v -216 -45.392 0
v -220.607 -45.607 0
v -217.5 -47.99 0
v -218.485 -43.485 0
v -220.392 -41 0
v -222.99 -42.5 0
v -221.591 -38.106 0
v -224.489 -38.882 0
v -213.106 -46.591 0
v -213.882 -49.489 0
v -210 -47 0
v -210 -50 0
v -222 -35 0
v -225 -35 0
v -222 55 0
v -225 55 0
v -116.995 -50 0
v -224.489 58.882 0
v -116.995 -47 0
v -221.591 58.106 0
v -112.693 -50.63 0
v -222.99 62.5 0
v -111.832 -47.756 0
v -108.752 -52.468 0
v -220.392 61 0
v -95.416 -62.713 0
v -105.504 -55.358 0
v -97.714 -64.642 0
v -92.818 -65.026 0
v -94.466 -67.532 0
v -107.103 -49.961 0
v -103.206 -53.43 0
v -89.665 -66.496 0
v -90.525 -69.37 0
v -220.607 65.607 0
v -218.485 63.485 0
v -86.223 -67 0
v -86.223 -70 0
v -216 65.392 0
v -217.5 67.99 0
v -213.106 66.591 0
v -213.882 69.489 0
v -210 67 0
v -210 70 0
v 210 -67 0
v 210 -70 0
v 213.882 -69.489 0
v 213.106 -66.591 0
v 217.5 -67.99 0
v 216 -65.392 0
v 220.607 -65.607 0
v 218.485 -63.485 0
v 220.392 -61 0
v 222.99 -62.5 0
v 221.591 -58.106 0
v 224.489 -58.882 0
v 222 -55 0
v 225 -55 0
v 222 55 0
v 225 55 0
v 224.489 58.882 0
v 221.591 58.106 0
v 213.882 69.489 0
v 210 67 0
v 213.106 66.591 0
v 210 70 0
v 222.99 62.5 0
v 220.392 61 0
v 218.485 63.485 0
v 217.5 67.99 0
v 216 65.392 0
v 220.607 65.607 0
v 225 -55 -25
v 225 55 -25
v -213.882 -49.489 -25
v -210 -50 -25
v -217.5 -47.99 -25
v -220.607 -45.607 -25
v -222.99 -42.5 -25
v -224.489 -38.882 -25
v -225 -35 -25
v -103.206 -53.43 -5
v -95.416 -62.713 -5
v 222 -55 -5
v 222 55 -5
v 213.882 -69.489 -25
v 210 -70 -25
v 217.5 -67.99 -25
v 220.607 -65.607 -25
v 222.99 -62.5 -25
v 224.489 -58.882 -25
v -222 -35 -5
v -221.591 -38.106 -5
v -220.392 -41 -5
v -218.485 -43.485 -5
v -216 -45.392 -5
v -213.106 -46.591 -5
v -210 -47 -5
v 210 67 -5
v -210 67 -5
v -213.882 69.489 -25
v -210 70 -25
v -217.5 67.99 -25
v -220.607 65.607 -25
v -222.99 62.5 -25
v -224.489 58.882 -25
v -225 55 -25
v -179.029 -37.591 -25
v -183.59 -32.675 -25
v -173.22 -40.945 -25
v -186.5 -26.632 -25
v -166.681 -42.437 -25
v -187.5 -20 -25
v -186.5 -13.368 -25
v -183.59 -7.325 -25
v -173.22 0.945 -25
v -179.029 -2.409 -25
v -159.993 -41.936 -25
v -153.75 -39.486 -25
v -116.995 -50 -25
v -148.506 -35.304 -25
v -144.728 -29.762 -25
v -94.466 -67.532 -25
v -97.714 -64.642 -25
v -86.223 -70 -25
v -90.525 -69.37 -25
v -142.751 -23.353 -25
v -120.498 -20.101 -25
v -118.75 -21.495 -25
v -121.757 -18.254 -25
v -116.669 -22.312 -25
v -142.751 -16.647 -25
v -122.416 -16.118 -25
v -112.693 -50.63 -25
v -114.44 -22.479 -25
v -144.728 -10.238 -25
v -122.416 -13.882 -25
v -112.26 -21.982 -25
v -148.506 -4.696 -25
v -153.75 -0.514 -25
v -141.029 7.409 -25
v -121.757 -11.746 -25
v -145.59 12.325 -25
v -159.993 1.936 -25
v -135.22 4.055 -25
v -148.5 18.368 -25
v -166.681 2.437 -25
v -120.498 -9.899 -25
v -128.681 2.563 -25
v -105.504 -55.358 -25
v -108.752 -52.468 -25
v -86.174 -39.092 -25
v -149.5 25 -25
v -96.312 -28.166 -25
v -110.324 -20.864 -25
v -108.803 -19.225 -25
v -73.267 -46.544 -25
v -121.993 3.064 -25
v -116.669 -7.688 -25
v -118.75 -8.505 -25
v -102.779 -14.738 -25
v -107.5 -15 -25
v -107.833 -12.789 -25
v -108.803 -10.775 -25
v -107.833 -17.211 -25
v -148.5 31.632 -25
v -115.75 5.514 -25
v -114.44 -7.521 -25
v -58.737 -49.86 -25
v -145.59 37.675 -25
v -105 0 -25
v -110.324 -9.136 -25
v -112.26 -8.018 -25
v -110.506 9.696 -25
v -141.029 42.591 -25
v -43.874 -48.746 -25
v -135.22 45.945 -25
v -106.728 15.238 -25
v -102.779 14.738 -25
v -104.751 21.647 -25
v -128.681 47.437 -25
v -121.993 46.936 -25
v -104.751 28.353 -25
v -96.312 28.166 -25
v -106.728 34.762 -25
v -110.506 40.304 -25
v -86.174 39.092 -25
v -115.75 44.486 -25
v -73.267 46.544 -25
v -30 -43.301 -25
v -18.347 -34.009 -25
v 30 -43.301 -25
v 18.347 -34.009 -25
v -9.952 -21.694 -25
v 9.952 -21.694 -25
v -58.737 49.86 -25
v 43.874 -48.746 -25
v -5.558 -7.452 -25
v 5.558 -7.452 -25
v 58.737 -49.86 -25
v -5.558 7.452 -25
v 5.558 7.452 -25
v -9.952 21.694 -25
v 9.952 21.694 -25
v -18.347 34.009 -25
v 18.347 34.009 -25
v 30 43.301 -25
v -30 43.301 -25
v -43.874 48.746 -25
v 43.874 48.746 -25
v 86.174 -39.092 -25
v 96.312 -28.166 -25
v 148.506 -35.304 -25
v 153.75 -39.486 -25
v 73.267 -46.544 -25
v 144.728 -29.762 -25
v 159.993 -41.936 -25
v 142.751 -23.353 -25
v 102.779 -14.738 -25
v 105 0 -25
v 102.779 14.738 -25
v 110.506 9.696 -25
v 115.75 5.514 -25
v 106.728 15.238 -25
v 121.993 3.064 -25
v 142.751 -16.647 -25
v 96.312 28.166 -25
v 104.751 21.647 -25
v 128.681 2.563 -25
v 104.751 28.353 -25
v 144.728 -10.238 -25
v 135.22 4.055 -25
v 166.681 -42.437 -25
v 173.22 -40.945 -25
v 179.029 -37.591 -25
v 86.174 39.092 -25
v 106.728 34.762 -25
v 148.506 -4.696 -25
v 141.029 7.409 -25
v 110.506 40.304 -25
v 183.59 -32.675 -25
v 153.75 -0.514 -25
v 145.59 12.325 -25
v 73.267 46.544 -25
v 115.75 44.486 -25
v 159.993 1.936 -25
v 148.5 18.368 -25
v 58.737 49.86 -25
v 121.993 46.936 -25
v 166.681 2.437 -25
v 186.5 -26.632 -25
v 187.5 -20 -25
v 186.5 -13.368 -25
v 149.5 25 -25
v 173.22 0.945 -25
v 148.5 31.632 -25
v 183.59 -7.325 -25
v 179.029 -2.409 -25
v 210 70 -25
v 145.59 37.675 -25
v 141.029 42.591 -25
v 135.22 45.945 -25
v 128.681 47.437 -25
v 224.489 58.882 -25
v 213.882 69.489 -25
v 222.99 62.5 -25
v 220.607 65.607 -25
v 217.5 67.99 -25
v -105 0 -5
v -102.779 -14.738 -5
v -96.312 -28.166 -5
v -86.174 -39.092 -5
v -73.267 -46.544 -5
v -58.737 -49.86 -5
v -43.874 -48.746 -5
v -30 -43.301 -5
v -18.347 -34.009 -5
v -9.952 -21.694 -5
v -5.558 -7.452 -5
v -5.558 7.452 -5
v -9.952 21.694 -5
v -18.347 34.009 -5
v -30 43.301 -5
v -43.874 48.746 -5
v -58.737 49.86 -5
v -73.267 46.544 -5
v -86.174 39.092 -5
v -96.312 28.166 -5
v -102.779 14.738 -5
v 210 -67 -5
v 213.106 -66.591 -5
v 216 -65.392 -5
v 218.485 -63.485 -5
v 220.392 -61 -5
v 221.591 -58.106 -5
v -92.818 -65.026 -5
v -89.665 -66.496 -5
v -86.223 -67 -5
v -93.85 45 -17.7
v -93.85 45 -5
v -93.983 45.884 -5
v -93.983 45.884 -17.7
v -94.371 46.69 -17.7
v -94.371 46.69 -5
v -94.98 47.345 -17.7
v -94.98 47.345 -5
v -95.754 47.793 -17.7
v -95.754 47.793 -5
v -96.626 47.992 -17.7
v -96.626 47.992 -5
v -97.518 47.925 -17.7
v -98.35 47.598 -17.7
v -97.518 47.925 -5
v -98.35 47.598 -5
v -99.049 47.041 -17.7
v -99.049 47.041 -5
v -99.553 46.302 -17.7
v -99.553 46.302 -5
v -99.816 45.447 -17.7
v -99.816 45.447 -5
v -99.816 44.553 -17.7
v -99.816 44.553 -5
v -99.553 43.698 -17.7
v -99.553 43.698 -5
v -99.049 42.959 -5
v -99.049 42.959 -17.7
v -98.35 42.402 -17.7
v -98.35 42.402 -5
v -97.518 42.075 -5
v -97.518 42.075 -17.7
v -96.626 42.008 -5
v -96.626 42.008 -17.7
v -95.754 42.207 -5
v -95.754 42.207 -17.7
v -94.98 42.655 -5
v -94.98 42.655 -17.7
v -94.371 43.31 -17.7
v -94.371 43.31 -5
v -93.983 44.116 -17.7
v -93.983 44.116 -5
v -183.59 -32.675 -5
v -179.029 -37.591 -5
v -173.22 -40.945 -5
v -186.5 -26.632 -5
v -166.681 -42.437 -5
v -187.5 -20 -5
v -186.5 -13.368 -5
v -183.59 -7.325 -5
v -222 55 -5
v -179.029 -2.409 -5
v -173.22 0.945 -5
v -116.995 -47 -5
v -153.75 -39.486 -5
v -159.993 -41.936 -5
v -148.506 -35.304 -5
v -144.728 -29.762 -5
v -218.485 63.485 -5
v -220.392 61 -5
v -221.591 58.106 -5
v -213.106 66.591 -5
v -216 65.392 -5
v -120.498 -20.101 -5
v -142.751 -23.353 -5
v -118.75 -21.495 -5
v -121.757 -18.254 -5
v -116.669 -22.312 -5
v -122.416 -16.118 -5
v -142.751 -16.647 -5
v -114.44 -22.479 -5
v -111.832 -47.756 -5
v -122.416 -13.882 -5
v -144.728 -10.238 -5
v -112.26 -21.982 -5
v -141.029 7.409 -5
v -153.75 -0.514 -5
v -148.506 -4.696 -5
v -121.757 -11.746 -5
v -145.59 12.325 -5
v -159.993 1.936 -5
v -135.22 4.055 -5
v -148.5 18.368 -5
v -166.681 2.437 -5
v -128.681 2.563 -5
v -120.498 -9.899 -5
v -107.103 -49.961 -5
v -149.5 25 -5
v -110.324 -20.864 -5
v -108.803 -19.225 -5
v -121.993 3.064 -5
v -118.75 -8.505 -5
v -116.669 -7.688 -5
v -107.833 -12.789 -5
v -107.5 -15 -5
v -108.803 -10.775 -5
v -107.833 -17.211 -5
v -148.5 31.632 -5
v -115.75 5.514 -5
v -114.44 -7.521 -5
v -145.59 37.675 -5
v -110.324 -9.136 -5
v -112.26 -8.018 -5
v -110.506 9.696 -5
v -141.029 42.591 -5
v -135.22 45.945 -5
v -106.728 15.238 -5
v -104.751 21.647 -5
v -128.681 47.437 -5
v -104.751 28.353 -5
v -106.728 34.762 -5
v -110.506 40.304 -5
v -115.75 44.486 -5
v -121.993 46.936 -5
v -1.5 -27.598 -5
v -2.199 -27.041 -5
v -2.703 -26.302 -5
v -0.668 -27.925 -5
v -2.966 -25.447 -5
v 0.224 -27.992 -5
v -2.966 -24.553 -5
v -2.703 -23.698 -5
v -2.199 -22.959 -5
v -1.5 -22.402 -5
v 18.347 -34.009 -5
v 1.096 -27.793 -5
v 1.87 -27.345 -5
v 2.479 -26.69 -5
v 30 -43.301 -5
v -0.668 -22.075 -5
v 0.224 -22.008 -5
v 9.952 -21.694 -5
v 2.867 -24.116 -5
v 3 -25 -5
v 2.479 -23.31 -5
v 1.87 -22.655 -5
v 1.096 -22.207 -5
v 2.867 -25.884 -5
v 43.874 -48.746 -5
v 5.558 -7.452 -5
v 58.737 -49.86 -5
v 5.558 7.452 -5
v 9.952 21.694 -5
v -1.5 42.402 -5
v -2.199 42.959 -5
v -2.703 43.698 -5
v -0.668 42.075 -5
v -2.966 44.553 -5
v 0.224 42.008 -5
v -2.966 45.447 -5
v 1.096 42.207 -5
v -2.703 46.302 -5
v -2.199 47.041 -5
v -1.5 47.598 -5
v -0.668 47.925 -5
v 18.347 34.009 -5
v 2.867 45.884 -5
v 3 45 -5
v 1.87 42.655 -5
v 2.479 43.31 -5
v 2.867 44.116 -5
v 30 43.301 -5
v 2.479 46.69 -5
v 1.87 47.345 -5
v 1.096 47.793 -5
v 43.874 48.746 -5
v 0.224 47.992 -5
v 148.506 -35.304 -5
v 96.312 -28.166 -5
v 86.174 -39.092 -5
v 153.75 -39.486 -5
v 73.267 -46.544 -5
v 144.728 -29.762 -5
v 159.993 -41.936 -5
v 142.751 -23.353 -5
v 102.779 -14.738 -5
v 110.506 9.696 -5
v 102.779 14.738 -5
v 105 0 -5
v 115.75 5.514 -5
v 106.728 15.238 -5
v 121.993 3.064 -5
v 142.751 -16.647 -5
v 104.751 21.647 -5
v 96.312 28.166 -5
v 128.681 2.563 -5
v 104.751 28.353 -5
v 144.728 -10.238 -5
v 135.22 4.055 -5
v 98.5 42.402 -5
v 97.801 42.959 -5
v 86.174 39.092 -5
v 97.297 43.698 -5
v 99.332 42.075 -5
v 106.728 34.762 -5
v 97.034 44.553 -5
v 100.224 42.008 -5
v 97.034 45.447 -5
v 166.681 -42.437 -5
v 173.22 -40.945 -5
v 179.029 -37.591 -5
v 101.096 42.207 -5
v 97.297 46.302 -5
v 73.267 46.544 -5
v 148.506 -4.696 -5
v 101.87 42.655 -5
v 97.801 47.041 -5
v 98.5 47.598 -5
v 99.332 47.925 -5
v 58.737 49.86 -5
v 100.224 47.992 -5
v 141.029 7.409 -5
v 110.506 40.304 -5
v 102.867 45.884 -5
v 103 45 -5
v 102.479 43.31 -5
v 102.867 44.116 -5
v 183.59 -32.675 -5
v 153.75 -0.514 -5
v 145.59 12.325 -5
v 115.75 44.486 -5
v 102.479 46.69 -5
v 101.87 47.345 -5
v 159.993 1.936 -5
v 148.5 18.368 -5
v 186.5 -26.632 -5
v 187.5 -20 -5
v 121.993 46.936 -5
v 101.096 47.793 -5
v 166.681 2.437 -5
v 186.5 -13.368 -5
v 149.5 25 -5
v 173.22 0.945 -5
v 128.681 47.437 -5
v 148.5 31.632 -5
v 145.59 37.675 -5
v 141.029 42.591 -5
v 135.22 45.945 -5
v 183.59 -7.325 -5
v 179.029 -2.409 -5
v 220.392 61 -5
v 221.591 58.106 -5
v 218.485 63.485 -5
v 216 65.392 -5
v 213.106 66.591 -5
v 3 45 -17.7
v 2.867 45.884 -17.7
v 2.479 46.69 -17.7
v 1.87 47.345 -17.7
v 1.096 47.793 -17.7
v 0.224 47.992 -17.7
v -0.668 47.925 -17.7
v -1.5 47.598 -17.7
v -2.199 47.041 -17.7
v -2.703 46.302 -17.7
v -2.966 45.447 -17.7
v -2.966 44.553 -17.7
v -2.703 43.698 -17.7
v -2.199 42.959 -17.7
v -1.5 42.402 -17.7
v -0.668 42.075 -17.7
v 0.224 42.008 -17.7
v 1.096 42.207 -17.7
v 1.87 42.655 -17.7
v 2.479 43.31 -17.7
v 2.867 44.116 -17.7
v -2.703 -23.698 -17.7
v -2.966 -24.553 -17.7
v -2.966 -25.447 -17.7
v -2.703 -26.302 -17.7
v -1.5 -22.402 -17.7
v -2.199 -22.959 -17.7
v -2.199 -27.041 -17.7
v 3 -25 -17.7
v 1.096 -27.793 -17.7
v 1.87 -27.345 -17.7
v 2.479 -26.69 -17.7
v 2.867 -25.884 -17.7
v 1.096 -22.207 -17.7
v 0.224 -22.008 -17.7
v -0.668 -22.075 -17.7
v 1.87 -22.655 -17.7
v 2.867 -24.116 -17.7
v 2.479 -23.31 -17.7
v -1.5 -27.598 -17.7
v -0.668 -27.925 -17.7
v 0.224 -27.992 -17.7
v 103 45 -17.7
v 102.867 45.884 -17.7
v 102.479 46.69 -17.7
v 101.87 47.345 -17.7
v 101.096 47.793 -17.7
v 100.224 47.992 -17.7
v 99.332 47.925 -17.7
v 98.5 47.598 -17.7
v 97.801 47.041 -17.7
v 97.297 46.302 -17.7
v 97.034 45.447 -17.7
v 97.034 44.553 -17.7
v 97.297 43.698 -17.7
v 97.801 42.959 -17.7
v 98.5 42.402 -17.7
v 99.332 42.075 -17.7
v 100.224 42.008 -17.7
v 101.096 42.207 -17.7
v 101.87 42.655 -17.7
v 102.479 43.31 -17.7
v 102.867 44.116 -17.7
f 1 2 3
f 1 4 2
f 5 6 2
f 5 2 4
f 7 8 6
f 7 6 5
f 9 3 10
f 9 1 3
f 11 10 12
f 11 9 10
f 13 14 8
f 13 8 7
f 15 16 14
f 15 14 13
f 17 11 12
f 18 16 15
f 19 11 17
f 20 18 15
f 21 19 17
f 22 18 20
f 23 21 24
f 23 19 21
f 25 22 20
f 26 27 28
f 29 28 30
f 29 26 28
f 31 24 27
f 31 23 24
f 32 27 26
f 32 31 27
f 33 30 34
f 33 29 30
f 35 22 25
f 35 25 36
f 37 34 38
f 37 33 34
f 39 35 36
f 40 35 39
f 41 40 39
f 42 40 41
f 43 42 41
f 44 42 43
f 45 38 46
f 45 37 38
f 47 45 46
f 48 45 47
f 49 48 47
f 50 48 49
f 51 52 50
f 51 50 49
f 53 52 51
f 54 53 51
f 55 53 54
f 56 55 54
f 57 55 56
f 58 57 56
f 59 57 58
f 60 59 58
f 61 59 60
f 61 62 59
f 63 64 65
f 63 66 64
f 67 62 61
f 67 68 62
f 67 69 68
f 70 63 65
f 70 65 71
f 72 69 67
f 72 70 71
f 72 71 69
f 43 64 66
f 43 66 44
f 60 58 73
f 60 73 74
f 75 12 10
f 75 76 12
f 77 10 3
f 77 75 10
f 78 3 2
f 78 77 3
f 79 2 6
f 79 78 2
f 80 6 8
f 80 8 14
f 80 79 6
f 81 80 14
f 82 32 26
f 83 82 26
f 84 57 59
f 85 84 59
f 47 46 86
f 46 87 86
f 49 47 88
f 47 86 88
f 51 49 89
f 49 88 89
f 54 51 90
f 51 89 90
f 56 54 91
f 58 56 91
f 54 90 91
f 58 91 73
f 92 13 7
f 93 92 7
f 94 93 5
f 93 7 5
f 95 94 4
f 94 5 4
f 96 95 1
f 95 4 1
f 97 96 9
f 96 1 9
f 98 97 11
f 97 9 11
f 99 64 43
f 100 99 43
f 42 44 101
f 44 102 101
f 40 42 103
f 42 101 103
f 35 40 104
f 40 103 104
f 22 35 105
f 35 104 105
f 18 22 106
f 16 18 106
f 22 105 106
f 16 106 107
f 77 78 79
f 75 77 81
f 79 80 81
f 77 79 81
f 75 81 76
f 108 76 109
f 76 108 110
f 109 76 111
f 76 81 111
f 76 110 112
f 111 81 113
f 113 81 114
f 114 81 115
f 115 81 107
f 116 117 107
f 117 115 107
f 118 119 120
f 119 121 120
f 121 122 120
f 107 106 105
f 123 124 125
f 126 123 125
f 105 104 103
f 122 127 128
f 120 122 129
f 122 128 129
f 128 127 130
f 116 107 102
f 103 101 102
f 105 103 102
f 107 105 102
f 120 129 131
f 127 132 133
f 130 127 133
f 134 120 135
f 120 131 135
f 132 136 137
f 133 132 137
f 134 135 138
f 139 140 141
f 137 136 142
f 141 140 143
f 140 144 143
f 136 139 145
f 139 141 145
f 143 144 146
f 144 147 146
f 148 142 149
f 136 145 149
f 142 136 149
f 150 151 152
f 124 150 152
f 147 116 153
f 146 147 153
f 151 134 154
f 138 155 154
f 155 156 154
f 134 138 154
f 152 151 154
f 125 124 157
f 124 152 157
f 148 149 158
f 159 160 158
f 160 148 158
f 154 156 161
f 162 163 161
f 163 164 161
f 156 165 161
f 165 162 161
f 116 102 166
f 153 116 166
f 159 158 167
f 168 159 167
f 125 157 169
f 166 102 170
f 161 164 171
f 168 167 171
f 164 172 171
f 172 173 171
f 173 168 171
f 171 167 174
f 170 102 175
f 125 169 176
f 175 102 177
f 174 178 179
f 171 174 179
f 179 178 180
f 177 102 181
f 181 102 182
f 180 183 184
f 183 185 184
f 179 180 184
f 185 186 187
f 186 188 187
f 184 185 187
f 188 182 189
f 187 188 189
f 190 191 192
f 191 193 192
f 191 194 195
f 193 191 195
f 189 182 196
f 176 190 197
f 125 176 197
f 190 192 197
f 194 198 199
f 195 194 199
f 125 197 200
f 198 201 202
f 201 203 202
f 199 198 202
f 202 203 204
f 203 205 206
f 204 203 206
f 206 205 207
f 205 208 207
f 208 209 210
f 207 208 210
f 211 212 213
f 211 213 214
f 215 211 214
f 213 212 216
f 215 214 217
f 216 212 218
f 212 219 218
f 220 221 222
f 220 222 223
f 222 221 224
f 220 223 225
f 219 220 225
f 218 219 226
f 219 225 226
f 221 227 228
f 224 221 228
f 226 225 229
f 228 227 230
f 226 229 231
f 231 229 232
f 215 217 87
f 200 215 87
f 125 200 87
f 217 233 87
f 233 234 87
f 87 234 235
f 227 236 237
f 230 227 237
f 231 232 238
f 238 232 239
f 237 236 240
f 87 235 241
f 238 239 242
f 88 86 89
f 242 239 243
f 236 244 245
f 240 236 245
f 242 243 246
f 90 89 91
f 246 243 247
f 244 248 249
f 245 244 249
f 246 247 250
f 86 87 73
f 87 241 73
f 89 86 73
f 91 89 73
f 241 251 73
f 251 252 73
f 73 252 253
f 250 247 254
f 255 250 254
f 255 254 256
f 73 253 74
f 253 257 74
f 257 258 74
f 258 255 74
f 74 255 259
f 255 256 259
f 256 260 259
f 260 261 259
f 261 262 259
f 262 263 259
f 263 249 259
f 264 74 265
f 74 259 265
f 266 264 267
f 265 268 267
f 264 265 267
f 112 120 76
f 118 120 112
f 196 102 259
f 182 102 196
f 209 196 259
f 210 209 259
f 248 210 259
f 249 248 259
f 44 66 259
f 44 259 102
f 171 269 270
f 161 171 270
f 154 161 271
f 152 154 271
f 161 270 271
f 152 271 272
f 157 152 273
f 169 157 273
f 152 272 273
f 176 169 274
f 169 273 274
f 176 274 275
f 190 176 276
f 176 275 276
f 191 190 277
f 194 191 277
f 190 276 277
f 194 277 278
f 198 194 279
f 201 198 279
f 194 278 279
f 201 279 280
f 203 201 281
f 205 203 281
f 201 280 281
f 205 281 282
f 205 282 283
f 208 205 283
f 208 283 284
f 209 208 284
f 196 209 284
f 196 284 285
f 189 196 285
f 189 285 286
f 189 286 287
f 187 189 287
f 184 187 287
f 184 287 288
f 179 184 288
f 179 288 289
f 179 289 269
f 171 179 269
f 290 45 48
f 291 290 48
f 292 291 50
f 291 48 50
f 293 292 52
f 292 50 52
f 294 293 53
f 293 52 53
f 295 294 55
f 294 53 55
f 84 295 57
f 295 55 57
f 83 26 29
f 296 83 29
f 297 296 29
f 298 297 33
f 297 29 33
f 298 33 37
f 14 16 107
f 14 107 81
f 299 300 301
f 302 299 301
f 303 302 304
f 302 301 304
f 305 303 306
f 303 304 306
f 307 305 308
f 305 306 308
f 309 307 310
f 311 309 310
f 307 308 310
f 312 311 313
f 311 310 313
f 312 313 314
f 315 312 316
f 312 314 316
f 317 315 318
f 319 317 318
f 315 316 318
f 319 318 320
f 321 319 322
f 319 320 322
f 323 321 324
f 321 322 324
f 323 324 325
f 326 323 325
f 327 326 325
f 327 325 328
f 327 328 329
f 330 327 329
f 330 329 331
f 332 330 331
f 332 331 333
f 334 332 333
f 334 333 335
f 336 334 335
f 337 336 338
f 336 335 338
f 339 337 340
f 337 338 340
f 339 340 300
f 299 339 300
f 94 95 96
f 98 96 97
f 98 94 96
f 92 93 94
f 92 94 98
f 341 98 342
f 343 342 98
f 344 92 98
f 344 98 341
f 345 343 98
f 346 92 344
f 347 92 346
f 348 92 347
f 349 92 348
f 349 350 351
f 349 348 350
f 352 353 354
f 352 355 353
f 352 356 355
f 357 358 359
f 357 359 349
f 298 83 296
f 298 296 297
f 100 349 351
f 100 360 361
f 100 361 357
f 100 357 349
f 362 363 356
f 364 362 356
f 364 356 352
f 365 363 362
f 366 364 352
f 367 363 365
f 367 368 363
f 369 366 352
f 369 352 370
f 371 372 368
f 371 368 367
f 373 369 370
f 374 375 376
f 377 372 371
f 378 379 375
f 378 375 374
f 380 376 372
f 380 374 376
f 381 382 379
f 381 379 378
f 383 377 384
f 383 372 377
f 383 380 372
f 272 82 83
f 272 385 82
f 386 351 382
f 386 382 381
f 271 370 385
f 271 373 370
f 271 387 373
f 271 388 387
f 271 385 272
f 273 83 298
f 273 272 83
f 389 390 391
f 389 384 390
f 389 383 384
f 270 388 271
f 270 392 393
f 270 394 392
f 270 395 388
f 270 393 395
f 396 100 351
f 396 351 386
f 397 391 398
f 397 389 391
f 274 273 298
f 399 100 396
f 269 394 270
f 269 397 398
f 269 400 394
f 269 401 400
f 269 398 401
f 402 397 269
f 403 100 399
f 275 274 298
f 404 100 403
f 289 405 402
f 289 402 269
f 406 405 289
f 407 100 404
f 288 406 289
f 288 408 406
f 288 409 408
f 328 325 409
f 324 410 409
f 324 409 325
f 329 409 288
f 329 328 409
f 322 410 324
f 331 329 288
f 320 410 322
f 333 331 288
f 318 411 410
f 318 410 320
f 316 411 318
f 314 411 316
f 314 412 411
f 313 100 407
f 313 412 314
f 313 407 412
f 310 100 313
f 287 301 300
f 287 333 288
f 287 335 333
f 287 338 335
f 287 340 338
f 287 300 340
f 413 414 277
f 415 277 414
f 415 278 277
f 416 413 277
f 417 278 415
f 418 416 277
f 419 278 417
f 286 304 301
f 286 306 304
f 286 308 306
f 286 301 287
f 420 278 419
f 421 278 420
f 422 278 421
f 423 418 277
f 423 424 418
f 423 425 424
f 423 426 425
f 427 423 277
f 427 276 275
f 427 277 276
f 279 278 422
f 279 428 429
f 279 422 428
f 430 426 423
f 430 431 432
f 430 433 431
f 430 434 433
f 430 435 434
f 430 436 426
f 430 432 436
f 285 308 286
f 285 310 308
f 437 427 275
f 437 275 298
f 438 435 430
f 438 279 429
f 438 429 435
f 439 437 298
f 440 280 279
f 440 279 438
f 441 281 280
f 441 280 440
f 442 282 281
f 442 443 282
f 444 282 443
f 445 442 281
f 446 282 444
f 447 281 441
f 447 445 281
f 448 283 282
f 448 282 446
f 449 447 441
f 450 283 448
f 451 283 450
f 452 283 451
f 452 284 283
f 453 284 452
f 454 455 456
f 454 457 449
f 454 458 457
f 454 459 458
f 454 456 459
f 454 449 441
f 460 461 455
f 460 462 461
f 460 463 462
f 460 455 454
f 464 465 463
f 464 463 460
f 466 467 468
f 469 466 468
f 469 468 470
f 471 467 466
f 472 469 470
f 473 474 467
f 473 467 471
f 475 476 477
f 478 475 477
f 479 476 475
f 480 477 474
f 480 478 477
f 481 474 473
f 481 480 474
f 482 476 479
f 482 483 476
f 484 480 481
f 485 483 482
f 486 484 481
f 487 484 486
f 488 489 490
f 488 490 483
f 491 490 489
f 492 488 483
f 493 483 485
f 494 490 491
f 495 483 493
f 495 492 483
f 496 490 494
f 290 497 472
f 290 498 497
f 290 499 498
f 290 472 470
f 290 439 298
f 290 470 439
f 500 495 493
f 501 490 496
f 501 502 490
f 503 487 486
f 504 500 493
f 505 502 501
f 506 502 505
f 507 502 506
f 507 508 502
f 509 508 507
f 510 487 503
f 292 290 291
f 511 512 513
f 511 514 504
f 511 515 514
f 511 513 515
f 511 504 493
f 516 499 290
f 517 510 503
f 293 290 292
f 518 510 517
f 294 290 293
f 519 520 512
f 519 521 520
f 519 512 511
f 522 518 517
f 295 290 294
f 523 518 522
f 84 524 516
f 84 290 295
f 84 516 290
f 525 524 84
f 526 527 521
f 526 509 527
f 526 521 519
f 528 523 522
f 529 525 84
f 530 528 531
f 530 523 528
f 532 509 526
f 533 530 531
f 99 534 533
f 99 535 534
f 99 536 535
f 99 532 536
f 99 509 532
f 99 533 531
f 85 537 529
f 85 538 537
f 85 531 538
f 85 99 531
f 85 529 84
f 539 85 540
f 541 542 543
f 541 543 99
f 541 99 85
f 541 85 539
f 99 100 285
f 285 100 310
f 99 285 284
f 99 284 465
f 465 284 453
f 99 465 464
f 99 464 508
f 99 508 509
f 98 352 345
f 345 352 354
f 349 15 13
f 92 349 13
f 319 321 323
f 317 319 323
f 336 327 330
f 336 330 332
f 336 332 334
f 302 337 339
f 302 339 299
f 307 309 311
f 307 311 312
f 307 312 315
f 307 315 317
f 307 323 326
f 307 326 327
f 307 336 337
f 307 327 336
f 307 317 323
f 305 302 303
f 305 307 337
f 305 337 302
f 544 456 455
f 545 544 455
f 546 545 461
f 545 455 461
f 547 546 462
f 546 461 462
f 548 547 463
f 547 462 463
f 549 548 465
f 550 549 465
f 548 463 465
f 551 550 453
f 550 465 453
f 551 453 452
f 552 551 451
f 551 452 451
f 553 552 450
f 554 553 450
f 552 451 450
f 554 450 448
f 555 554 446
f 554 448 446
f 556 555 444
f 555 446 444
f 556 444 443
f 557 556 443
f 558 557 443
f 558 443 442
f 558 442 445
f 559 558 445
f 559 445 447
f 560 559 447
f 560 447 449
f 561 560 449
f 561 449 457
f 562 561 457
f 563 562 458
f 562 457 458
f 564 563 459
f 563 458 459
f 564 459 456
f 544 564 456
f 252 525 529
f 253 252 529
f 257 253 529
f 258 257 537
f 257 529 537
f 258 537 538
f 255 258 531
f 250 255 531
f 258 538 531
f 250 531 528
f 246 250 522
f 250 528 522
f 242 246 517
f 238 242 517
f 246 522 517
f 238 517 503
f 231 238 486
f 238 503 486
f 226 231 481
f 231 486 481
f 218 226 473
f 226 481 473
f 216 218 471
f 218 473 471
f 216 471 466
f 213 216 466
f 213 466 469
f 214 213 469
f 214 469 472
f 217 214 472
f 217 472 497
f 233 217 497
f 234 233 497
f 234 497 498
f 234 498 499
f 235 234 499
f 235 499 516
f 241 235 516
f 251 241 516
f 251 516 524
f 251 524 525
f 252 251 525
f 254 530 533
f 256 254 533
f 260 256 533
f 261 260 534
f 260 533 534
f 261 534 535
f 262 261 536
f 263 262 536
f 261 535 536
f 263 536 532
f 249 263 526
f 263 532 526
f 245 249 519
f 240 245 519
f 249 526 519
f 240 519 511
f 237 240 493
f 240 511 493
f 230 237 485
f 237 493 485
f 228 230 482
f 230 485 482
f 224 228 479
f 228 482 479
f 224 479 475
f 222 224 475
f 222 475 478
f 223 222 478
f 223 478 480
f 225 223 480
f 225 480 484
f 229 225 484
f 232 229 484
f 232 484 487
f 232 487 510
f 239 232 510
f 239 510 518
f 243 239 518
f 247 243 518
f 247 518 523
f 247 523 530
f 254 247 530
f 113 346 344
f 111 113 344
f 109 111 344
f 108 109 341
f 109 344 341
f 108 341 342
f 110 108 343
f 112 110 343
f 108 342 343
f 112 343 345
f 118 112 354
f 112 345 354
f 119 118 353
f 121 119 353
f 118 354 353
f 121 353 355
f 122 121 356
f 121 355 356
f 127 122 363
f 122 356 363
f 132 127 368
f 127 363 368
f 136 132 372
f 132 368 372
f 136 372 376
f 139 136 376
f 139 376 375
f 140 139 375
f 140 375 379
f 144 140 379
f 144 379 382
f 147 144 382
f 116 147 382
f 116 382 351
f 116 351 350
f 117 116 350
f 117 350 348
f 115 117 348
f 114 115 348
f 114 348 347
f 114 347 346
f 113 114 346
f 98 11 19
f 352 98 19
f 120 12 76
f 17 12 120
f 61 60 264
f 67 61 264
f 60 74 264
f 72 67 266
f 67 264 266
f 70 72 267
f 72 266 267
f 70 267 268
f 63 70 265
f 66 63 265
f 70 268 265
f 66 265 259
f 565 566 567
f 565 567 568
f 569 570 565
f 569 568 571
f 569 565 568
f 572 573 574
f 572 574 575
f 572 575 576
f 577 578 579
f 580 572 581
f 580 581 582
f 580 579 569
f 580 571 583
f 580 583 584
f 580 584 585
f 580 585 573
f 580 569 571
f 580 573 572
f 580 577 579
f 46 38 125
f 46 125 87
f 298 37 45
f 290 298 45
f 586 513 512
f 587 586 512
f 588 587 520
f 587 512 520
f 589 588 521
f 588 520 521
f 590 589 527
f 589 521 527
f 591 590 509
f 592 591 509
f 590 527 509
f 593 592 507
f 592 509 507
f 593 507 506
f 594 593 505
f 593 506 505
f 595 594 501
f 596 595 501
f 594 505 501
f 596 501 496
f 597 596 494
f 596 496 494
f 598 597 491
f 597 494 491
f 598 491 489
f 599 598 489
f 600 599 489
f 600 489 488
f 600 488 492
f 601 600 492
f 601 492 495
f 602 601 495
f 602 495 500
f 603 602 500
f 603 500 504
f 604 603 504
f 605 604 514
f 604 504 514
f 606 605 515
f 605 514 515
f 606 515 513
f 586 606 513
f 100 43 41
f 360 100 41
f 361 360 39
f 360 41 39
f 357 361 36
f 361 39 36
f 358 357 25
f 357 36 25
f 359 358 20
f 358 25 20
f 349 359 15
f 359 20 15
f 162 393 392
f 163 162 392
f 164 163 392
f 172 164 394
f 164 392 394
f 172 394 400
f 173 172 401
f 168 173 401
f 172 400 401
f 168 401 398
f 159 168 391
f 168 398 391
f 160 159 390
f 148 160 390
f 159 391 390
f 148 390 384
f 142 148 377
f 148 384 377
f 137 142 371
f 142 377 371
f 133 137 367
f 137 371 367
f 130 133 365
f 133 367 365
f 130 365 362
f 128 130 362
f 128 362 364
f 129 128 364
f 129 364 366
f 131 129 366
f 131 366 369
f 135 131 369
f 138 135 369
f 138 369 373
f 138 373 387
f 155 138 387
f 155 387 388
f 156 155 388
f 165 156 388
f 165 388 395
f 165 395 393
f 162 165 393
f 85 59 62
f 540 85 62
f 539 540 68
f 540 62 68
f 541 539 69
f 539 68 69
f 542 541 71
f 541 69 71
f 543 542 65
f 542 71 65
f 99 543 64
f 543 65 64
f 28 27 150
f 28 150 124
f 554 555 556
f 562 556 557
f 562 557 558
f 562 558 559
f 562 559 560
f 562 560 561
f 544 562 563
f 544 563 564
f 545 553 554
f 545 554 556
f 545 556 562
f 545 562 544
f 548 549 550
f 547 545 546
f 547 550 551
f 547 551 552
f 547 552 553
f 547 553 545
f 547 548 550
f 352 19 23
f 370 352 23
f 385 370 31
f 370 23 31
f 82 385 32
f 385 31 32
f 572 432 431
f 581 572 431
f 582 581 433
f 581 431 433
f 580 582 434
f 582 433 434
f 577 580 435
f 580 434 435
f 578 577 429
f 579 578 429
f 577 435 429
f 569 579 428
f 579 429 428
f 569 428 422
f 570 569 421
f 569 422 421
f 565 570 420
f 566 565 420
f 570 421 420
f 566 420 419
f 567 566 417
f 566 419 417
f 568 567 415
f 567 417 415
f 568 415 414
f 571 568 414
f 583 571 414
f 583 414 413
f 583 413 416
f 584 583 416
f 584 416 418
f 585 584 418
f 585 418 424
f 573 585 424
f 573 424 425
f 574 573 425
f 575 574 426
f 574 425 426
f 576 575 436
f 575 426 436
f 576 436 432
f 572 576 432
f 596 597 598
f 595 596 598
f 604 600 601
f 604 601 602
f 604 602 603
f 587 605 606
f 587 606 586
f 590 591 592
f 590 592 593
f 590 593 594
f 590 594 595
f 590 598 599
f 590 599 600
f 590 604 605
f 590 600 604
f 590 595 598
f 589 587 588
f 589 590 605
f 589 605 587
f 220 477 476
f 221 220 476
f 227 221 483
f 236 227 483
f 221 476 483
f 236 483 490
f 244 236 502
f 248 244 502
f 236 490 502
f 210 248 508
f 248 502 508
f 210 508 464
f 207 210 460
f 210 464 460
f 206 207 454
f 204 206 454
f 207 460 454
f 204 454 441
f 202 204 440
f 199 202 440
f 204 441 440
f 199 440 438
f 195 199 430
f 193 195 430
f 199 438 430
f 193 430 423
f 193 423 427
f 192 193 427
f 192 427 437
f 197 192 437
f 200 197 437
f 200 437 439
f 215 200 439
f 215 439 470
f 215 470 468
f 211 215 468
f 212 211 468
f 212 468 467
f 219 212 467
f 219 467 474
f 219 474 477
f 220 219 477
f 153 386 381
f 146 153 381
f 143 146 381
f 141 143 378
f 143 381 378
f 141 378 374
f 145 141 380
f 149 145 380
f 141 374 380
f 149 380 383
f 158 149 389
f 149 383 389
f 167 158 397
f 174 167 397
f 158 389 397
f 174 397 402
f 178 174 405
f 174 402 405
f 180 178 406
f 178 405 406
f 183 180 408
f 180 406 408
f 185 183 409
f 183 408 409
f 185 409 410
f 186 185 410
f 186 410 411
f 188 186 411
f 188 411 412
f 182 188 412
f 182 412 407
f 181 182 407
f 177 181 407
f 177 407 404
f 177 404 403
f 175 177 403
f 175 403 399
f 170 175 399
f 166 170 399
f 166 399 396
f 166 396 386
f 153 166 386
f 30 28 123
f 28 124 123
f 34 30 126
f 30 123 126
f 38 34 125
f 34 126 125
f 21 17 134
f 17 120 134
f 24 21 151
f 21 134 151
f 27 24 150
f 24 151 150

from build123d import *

# Parameters (mm, degrees)
BOSS_EXTRUDE1_DEPTH = 25
FILLET1_R           = 15
SKETCH2_R           = 50
SKETCH2_R_2         = 22.5
SKETCH2_R_3         = 7.5
CUT_EXTRUDE1_DEPTH  = 237.959912221
CUT_EXTRUDE2_DEPTH  = 5
SKETCH5_R           = 3
CUT_EXTRUDE3_DEPTH  = 12.7


with BuildPart() as part:
    # Sketch1 → Boss-Extrude1 (new body)
    with BuildSketch(Plane.XY):
        Polygon((-225, -50), (-110, -50), (-93.218007376, -70), (225, -70), (225, 70), (-225, 70), align=None)
    extrude(amount=-BOSS_EXTRUDE1_DEPTH)

    # Fillet1
    fillet1_edges = [part.edges().sort_by_distance(p)[0] for p in [
        (225, -70, -12.5),
        (-93.218007376, -70, -12.5),
        (-110, -50, -12.5),
        (-225, -50, -12.5),
        (-225, 70, -12.5),
        (225, 70, -12.5),
    ]]
    fillet(fillet1_edges, radius=FILLET1_R)

    # Sketch2 → Cut-Extrude1 (cut, through all)
    with BuildSketch(Plane.XY):
        with Locations((55, 0)):
            Circle(SKETCH2_R)
        with Locations((127, 25)):
            Circle(SKETCH2_R_2)
        with Locations((165, -20)):
            Circle(SKETCH2_R_2)
        with Locations(Location((-165, -20, 0), (0, 0, 180))):
            Circle(SKETCH2_R_2)
        with Locations(Location((-127, 25, 0), (0, 0, 180))):
            Circle(SKETCH2_R_2)
        with Locations(Location((-55, 0, 0), (0, 0, 180))):
            Circle(SKETCH2_R)
        with Locations((-115, -15)):
            Circle(SKETCH2_R_3)
    extrude(amount=-CUT_EXTRUDE1_DEPTH, mode=Mode.SUBTRACT)

    # Sketch4 → Cut-Extrude2 (cut)
    with BuildSketch(Plane.XY):
        with BuildLine():
            Line((-103.205814896, -53.429823026), (-95.415925822, -62.713451316))
            ThreePointArc((-95.415925822, -62.713451316), (-91.294811645, -65.875693444), (-86.223392504, -67))
            Line((-86.223392504, -67), (210, -67))
            ThreePointArc((210, -67), (218.485281374, -63.485281374), (222, -55))
            Line((222, -55), (222, 55))
            ThreePointArc((222, 55), (218.485281374, 63.485281374), (210, 67))
            Line((210, 67), (-210, 67))
            ThreePointArc((-210, 67), (-218.485281374, 63.485281374), (-222, 55))
            Line((-222, 55), (-222, -35))
            ThreePointArc((-222, -35), (-218.485281374, -43.485281374), (-210, -47))
            Line((-210, -47), (-116.994614872, -47))
            ThreePointArc((-116.994614872, -47), (-109.387486161, -48.686459833), (-103.205814896, -53.429823026))
        make_face()
    extrude(amount=-CUT_EXTRUDE2_DEPTH, mode=Mode.SUBTRACT)

    # Sketch5 → Cut-Extrude3 (cut)
    with BuildSketch(Plane.XY.offset(-5)):
        with Locations((0, 45)):
            Circle(SKETCH5_R)
        with Locations((0, -25)):
            Circle(SKETCH5_R)
        with Locations((100, 45)):
            Circle(SKETCH5_R)
        with Locations((-96.85, 45)):
            Circle(SKETCH5_R)
    extrude(amount=-CUT_EXTRUDE3_DEPTH, mode=Mode.SUBTRACT)


solid = part.part
